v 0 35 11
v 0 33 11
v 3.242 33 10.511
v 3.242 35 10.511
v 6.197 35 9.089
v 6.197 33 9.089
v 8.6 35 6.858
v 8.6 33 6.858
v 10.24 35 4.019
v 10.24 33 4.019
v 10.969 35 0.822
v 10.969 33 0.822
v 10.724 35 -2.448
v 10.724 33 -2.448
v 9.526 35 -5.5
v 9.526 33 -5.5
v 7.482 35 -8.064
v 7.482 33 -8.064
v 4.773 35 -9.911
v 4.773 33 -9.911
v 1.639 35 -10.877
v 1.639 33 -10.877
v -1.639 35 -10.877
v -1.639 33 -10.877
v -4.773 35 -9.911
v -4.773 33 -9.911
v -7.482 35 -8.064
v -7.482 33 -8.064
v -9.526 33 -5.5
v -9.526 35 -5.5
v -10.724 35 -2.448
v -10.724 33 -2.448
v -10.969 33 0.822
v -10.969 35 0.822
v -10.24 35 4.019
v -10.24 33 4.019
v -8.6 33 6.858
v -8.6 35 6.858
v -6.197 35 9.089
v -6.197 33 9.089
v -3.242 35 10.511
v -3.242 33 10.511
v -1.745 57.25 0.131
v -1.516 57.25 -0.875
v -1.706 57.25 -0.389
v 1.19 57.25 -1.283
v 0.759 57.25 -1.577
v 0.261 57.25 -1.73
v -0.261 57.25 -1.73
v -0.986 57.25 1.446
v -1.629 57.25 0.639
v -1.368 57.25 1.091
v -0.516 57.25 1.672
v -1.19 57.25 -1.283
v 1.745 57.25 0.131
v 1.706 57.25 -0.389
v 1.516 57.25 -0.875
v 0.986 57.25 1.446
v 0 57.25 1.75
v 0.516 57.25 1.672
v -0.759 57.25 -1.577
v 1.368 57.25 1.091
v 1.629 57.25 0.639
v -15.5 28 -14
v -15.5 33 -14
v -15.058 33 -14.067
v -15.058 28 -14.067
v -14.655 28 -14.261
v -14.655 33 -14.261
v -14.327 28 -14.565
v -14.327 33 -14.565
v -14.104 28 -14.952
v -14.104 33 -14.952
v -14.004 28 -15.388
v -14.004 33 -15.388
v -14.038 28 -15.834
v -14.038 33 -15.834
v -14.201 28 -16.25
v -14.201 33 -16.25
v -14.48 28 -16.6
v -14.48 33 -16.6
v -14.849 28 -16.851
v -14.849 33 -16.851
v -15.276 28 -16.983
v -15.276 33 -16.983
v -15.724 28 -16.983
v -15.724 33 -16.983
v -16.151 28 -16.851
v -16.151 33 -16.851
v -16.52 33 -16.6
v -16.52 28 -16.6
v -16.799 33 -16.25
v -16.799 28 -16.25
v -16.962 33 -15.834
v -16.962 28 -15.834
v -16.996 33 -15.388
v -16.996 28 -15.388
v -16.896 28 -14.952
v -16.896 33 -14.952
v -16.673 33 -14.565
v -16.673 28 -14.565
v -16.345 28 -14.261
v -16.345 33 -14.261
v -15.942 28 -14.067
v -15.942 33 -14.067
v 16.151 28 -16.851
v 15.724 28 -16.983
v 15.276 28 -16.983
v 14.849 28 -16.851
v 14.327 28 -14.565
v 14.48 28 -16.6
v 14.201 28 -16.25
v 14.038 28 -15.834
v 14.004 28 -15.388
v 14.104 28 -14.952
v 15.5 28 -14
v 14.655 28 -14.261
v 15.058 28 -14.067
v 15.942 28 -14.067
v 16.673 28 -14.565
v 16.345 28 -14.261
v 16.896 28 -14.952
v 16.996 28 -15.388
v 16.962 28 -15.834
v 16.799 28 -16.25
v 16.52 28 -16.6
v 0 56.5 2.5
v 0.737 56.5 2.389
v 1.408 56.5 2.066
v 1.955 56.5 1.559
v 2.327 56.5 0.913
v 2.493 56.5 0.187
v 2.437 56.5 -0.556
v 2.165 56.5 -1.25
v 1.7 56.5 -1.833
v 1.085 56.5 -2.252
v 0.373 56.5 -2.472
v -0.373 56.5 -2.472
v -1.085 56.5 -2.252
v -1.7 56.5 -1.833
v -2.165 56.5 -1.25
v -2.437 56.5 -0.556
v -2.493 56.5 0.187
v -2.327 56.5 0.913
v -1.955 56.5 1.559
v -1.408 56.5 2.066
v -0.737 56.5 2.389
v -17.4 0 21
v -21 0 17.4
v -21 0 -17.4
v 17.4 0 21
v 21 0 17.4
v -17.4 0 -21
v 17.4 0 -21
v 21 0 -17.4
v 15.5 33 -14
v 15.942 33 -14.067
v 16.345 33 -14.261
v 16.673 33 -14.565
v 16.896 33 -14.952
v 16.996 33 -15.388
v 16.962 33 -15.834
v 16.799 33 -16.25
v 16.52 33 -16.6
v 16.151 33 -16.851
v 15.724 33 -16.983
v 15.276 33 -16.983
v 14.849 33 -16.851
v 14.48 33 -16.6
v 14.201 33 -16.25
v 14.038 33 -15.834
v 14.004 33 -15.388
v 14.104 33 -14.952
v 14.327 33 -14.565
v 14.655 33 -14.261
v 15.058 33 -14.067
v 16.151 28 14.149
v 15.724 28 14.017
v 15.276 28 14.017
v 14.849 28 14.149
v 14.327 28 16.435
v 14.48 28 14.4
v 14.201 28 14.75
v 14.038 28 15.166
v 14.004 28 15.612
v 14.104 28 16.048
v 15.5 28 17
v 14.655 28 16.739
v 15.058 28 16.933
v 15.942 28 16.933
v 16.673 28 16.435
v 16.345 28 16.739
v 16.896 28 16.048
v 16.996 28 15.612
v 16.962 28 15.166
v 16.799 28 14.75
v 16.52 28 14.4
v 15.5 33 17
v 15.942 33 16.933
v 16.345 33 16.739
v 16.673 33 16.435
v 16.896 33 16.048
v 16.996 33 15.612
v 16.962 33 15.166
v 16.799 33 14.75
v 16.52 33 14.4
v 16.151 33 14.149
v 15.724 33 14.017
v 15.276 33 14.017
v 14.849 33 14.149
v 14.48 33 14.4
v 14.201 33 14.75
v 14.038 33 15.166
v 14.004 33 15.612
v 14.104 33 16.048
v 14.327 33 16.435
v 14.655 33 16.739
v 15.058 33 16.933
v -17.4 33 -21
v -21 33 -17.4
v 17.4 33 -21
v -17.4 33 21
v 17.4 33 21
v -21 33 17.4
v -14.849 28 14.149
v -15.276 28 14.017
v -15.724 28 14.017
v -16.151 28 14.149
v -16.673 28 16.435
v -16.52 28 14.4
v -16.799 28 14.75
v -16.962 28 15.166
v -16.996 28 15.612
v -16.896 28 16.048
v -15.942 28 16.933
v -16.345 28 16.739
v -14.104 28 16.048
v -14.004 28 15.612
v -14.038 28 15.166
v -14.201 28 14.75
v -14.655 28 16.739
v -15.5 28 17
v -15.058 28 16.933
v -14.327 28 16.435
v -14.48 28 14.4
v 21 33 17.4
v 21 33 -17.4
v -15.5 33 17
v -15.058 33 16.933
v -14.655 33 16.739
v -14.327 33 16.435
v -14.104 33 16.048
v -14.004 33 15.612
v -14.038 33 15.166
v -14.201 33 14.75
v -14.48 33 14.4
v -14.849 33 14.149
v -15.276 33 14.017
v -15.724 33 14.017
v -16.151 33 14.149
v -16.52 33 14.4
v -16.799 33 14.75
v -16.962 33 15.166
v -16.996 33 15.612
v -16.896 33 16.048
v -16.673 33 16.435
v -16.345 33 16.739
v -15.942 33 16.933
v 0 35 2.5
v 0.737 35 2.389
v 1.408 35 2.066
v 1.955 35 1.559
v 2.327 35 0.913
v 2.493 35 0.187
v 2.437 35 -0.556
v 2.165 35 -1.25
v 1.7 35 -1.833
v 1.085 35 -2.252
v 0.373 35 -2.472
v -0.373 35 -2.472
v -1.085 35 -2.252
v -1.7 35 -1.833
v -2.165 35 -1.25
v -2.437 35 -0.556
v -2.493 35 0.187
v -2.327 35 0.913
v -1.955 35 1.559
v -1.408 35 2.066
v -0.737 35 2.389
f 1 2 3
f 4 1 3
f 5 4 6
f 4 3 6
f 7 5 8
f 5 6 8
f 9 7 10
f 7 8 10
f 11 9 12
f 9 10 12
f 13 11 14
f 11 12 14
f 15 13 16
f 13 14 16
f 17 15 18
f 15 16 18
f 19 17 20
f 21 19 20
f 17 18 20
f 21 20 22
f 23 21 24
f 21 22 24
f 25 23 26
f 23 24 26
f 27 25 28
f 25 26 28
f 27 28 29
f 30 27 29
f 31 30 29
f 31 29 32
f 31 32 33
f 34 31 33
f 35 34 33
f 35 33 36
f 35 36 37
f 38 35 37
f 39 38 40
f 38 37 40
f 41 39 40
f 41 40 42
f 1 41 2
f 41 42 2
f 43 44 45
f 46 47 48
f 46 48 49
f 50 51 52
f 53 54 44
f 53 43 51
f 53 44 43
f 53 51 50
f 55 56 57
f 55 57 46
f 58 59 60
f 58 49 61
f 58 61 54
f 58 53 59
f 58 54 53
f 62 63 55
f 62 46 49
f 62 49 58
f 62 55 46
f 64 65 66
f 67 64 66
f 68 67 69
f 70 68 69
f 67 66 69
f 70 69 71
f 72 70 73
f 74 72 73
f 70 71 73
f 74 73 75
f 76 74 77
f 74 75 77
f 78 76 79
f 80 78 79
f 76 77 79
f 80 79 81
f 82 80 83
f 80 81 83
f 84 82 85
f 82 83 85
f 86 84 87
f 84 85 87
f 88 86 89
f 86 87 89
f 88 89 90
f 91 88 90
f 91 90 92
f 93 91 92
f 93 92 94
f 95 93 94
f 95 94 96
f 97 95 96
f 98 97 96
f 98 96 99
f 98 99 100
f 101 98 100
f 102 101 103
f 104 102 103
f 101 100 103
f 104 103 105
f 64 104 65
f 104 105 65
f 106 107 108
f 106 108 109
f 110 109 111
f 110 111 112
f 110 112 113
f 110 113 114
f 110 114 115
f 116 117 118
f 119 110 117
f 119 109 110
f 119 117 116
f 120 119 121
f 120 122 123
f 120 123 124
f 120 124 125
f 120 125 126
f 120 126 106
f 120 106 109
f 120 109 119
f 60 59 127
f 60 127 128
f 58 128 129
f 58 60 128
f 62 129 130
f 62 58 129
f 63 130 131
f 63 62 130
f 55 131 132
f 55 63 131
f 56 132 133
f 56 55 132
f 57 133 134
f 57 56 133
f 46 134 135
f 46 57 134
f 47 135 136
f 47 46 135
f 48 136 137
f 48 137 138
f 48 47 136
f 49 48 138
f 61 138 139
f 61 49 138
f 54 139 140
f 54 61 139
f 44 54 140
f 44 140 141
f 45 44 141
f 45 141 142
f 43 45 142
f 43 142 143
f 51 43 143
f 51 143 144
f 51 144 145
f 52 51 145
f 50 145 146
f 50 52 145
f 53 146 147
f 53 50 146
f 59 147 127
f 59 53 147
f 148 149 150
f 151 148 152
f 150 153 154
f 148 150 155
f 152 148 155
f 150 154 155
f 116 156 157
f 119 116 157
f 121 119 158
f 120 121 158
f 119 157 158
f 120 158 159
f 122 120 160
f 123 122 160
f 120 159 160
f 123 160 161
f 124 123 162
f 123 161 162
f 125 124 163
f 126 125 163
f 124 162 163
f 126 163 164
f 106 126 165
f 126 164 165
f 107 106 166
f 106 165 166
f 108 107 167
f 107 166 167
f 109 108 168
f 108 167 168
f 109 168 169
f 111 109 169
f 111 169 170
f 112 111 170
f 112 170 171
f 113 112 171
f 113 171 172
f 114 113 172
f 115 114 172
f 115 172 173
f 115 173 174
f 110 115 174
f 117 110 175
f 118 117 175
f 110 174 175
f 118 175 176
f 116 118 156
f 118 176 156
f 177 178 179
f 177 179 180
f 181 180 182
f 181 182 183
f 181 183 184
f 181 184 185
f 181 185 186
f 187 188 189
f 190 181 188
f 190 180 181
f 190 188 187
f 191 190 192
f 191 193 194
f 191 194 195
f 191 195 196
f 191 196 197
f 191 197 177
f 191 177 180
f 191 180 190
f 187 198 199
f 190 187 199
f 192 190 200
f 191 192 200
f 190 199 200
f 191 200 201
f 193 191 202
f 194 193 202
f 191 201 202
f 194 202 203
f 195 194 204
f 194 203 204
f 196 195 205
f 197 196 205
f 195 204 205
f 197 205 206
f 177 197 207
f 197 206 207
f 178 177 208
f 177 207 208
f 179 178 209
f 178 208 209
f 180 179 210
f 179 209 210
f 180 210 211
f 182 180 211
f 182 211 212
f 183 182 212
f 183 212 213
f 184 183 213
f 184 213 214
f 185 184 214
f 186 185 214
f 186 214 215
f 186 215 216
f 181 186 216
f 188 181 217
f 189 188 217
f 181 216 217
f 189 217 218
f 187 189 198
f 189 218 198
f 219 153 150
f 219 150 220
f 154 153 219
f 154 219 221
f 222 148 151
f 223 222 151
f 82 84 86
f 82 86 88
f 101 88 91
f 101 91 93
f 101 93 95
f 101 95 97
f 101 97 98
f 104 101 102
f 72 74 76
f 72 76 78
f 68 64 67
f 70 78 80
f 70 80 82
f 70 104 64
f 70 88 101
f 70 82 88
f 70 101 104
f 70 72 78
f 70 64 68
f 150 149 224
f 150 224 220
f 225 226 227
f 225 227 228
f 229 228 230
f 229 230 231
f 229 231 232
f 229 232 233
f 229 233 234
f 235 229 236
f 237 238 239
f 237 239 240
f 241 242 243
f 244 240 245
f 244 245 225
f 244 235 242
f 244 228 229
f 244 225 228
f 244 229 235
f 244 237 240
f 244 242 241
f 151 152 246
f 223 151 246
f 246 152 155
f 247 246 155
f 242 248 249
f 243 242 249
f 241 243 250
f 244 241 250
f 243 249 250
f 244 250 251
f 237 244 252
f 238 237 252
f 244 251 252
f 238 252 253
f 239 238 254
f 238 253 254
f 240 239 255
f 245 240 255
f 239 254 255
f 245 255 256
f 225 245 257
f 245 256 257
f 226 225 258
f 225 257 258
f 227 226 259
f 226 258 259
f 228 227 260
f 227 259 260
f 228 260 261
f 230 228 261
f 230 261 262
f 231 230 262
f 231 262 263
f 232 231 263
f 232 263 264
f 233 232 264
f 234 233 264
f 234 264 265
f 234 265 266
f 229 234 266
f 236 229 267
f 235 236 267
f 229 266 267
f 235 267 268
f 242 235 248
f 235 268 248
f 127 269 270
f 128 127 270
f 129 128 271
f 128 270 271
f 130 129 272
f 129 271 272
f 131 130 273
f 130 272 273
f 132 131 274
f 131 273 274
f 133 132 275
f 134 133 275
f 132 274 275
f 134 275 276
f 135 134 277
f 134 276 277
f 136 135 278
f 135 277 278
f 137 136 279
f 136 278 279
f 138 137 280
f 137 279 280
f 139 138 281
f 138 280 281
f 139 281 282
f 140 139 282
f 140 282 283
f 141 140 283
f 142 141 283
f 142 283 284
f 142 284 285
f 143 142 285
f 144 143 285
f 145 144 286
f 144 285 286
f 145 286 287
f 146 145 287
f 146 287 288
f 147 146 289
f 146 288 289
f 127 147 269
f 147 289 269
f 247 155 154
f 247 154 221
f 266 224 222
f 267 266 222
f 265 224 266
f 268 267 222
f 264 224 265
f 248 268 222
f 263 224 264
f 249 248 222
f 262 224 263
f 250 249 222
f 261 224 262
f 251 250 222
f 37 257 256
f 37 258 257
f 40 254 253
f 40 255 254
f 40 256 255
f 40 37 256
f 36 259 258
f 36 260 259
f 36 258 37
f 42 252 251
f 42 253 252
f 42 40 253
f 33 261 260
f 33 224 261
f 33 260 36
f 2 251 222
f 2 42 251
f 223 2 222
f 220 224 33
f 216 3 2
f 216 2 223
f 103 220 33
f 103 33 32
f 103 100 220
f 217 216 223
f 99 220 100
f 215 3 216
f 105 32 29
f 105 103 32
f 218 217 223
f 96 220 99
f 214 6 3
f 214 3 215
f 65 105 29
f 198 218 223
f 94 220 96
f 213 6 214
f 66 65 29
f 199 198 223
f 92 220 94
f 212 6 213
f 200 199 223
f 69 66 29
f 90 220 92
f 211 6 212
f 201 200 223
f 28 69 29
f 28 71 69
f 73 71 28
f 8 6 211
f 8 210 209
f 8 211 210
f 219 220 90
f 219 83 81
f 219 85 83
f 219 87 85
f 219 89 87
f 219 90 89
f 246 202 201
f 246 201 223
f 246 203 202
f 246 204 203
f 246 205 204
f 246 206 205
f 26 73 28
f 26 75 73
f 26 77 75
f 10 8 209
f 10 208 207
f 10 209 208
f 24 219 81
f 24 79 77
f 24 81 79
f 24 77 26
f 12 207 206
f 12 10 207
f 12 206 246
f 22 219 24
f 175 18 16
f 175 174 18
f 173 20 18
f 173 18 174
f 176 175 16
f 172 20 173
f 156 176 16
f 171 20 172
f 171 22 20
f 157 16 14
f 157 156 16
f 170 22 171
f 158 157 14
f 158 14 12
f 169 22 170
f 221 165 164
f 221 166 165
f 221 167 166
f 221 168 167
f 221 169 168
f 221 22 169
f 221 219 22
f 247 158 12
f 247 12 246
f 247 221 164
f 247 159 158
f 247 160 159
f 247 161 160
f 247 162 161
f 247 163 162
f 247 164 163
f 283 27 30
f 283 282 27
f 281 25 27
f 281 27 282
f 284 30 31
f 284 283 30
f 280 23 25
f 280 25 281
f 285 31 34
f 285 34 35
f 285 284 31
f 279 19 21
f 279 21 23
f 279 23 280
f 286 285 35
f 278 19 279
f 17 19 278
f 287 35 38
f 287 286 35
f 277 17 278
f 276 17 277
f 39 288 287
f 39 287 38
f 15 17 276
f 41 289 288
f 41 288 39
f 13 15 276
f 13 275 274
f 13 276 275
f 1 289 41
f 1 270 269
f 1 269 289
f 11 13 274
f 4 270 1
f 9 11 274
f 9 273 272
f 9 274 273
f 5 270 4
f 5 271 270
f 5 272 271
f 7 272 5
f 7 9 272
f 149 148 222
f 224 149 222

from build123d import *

# Parameters (mm, degrees)
SKETCH1_W           = 42
SKETCH1_H           = 42
BOSS_EXTRUDE1_DEPTH = 33
SKETCH2_R           = 11
BOSS_EXTRUDE2_DEPTH = 2
SKETCH3_R           = 2.5
BOSS_EXTRUDE3_DEPTH = 22.25
CHAMFER1_SIZE       = 3.6
SKETCH4_R           = 1.5
CUT_EXTRUDE1_DEPTH  = 5
CHAMFER2_SIZE       = 0.75


with BuildPart() as part:
    # Sketch1 → Boss-Extrude1 (new body)
    with BuildSketch(Plane(origin=(0, 0, 0), x_dir=(1, 0, 0), z_dir=(0, 1, 0))):
        Rectangle(SKETCH1_W, SKETCH1_H)
    extrude(amount=BOSS_EXTRUDE1_DEPTH)

    # Sketch2 → Boss-Extrude2 (add)
    with BuildSketch(Plane(origin=(0, 33, 0), x_dir=(1, 0, 0), z_dir=(0, 1, 0))):
        with Locations(Location((0, 0, 0), (0, 0, 270))):
            Circle(SKETCH2_R)
    extrude(amount=BOSS_EXTRUDE2_DEPTH)

    # Sketch3 → Boss-Extrude3 (add)
    with BuildSketch(Plane(origin=(0, 35, 0), x_dir=(1, 0, 0), z_dir=(0, 1, 0))):
        with Locations(Location((0, 0, 0), (0, 0, 270))):
            Circle(SKETCH3_R)
    extrude(amount=BOSS_EXTRUDE3_DEPTH)

    # Chamfer1
    chamfer1_edges = [part.edges().sort_by_distance(p)[0] for p in [
        (21, 16.5, 21),
        (-21, 16.5, 21),
        (-21, 16.5, -21),
        (21, 16.5, -21),
    ]]
    chamfer(chamfer1_edges, length=CHAMFER1_SIZE)

    # Sketch4 → Cut-Extrude1 (cut)
    with BuildSketch(Plane(origin=(0, 33, 0), x_dir=(1, 0, 0), z_dir=(0, 1, 0))):
        with Locations(Location((15.5, 15.5, 0), (0, 0, 270))):
            Circle(SKETCH4_R)
        with Locations(Location((15.5, -15.5, 0), (0, 0, 270))):
            Circle(SKETCH4_R)
        with Locations(Location((-15.5, -15.5, 0), (0, 0, 270))):
            Circle(SKETCH4_R)
        with Locations(Location((-15.5, 15.5, 0), (0, 0, 270))):
            Circle(SKETCH4_R)
    extrude(amount=-CUT_EXTRUDE1_DEPTH, mode=Mode.SUBTRACT)

    # Chamfer2
    chamfer2_edges = [part.edges().sort_by_distance(p)[0] for p in [
        (0, 57.25, -2.5),
    ]]
    chamfer(chamfer2_edges, length=CHAMFER2_SIZE)


solid = part.part
